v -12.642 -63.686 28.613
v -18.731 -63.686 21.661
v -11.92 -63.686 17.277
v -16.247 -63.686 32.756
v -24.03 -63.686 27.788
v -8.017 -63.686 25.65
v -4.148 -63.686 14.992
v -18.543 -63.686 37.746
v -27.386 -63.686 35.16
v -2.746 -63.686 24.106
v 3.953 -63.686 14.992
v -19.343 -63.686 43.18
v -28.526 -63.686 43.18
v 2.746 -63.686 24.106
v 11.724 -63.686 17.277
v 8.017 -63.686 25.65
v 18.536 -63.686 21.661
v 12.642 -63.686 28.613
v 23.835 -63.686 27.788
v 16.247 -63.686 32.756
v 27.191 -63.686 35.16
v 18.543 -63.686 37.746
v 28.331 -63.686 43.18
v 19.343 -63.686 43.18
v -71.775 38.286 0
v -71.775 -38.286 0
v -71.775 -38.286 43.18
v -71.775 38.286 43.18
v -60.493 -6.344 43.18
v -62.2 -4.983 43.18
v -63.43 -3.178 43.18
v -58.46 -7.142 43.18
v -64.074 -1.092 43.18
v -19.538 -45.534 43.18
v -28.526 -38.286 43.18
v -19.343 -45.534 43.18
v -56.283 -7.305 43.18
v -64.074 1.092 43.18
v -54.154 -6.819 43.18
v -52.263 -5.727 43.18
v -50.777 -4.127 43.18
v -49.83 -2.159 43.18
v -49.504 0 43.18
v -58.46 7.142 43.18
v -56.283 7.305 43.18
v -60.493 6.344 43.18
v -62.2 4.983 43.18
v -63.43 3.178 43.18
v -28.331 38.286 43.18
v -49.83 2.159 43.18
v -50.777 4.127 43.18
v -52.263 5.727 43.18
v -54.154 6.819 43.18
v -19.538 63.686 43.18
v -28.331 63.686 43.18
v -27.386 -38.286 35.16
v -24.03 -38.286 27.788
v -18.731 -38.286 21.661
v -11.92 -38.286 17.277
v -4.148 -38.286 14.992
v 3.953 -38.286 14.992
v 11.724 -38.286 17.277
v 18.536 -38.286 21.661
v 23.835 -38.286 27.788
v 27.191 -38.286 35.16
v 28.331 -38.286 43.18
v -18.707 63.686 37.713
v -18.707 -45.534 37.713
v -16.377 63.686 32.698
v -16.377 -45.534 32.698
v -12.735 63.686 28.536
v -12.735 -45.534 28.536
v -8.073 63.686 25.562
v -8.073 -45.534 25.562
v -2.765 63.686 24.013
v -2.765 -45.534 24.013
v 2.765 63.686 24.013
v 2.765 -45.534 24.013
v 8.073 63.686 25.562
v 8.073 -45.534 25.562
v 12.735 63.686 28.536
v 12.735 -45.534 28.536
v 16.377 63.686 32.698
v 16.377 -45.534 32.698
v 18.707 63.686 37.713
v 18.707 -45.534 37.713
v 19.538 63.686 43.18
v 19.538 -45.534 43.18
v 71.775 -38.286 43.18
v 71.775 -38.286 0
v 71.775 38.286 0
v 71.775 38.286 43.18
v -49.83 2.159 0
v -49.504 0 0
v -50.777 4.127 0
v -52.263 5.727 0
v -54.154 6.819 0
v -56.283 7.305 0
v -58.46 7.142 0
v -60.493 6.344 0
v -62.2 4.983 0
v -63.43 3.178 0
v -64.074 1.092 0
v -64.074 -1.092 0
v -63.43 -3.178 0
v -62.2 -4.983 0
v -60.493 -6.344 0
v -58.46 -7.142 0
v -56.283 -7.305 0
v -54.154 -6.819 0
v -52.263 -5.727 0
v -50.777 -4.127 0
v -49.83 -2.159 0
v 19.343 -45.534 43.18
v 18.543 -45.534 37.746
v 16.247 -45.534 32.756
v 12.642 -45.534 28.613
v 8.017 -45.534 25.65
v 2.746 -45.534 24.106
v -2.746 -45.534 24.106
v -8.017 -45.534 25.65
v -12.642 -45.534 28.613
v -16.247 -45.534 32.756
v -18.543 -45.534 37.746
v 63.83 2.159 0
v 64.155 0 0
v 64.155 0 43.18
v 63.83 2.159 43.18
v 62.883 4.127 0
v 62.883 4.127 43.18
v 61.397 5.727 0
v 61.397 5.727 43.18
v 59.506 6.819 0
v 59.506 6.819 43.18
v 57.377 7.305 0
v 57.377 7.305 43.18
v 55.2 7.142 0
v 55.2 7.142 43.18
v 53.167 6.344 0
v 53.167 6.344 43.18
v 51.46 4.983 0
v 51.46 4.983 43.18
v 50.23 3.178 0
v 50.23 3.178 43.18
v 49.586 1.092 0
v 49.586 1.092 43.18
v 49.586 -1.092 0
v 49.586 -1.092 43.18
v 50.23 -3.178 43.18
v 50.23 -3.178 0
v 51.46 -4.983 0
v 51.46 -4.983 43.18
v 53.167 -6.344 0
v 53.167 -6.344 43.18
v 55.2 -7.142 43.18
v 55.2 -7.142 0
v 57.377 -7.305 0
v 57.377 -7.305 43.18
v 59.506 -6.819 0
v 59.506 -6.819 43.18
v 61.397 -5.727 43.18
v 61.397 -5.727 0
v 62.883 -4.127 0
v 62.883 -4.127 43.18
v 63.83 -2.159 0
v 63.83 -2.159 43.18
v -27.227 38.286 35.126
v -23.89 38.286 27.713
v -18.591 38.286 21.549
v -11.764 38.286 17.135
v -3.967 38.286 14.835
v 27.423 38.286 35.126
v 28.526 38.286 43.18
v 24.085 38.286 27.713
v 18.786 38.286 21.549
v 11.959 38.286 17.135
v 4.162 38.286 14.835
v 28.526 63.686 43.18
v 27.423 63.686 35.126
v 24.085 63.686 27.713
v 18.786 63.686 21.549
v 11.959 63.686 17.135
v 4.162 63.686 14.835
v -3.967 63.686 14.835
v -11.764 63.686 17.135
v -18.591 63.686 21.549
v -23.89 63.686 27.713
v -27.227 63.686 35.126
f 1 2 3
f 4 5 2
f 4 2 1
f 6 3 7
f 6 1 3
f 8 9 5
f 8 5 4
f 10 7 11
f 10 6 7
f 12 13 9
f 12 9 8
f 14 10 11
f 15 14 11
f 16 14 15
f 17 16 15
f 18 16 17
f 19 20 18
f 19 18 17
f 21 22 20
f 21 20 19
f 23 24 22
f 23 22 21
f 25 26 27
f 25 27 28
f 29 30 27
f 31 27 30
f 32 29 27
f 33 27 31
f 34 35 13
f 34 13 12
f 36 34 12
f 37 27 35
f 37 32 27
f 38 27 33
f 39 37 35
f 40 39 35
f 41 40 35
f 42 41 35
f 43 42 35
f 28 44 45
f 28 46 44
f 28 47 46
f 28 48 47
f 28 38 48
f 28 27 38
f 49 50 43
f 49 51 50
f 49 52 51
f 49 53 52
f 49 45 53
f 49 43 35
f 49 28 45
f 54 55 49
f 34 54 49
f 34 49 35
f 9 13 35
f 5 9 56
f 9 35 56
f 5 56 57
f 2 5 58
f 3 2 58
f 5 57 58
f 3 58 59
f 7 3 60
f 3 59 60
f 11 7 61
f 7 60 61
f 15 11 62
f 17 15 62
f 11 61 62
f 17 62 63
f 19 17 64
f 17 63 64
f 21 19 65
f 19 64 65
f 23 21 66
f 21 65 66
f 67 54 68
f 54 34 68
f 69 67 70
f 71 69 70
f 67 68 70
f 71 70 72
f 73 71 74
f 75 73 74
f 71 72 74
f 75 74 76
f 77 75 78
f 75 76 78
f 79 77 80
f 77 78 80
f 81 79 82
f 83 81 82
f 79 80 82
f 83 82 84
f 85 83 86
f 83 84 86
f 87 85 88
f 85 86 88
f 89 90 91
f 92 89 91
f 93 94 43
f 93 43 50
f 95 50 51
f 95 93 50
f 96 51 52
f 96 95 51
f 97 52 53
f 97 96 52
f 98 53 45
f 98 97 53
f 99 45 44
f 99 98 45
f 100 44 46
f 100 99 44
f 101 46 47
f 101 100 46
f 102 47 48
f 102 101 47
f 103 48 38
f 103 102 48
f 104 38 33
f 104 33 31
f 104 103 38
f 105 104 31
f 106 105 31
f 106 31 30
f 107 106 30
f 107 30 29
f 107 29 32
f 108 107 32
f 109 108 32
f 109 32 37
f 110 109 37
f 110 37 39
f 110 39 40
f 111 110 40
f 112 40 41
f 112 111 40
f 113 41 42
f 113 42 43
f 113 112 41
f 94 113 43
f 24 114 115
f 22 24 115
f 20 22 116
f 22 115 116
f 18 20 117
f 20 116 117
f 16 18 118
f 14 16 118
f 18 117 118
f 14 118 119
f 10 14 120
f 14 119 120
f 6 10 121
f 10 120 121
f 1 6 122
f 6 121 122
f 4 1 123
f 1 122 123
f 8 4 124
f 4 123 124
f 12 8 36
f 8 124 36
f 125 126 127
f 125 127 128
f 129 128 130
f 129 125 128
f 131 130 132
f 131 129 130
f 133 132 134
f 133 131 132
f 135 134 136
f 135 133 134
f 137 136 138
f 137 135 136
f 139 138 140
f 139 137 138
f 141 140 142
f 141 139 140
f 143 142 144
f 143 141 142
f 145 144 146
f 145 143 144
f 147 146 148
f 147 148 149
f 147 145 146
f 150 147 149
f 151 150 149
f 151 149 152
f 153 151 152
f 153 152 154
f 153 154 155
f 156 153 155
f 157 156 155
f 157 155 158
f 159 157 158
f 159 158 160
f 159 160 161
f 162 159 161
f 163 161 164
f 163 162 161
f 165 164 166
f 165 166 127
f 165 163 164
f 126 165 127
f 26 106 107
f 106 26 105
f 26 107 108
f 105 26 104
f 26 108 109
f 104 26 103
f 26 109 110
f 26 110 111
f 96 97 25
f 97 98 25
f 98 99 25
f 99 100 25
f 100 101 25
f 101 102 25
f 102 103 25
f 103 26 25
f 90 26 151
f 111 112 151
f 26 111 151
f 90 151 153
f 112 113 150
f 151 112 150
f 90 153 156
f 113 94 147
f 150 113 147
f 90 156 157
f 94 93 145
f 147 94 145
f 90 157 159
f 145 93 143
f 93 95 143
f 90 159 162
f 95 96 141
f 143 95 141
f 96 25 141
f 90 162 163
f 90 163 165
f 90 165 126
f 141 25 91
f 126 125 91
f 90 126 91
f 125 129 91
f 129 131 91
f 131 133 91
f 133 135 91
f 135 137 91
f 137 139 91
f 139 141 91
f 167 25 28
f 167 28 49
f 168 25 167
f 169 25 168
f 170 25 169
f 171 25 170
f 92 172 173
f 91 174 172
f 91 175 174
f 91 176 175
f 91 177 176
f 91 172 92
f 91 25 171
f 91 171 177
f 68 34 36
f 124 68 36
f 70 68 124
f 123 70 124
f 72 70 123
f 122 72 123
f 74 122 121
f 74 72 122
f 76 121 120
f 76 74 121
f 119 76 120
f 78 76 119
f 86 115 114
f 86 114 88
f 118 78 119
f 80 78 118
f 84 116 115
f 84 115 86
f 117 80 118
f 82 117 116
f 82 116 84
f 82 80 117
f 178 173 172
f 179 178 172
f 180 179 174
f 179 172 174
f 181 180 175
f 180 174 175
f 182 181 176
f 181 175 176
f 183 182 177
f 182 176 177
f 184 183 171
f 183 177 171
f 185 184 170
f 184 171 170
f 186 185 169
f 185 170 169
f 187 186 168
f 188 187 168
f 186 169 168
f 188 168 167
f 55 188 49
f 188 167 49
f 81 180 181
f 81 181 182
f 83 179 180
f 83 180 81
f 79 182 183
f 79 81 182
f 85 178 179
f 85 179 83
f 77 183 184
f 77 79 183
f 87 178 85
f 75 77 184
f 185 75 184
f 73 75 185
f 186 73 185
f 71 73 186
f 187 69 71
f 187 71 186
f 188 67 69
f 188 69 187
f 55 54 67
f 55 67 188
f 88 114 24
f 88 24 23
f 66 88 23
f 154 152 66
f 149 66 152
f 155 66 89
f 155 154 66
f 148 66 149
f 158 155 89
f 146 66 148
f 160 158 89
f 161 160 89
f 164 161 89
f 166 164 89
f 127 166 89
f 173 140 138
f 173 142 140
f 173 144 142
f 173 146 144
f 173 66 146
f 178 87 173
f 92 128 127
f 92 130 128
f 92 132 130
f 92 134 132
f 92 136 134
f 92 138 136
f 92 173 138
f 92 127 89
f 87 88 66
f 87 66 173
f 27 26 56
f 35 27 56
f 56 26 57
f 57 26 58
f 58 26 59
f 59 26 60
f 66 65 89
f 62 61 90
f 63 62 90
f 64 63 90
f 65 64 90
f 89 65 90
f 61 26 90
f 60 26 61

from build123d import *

# Parameters (mm, degrees)
F0_W     = 143.5509369683
F0_H     = 76.5728146038
F0_R     = 7.3255293143
F1_DEPTH = 43.18
F3_DEPTH = 25.4
F5_DEPTH = 25.4
F6_DEPTH = 83.82


with BuildPart() as f1:
    # F0 (on Top) → F1 (new body)
    with BuildSketch(Plane.XY):
        Rectangle(F0_W, F0_H)
        with Locations((-56.8299391699, 0)):
            Circle(F0_R, mode=Mode.SUBTRACT)
        with Locations((56.8299391699, 0)):
            Circle(F0_R, mode=Mode.SUBTRACT)
    extrude(amount=F1_DEPTH)

    # F2 (on face) → F3 (join)
    with BuildSketch(Plane.XZ.offset(38.2864073019)):
        with BuildLine():
            Line((-19.3430762738, 43.18), (-28.5261534154, 43.18))
            ThreePointArc((-28.5261534154, 43.18), (-0.0976910815, 14.70231059), (28.3307712525, 43.18))
            Line((28.3307712525, 43.18), (19.3430762738, 43.18))
            ThreePointArc((19.3430762738, 43.18), (0, 23.9099304509), (-19.3430762738, 43.18))
        make_face()
    extrude(amount=F3_DEPTH)

    # F4 (on face) → F5 (join)
    with BuildSketch(Plane(origin=(0, 38.2864073019, 0), x_dir=(-1, 0, 0), z_dir=(0, 1, 0))):
        with BuildLine():
            Line((-19.538462162, 43.18), (-28.5261534154, 43.18))
            ThreePointArc((-28.5261534154, 43.18), (-0.0976910815, 14.5425554008), (28.3307712525, 43.18))
            Line((28.3307712525, 43.18), (19.5384602994, 43.18))
            ThreePointArc((19.5384602994, 43.18), (-9.313e-07, 23.8160529924), (-19.538462162, 43.18))
        make_face()
    extrude(amount=F5_DEPTH)

    # F6 (cut): a face of the model
    f6_faces = [f1.faces().sort_by_distance(p)[0] for p in [
        (9.313e-07, 38.2864073019, 34.9677769674),
    ]]
    extrude(f6_faces, amount=-F6_DEPTH, mode=Mode.SUBTRACT)


solid = f1.part
